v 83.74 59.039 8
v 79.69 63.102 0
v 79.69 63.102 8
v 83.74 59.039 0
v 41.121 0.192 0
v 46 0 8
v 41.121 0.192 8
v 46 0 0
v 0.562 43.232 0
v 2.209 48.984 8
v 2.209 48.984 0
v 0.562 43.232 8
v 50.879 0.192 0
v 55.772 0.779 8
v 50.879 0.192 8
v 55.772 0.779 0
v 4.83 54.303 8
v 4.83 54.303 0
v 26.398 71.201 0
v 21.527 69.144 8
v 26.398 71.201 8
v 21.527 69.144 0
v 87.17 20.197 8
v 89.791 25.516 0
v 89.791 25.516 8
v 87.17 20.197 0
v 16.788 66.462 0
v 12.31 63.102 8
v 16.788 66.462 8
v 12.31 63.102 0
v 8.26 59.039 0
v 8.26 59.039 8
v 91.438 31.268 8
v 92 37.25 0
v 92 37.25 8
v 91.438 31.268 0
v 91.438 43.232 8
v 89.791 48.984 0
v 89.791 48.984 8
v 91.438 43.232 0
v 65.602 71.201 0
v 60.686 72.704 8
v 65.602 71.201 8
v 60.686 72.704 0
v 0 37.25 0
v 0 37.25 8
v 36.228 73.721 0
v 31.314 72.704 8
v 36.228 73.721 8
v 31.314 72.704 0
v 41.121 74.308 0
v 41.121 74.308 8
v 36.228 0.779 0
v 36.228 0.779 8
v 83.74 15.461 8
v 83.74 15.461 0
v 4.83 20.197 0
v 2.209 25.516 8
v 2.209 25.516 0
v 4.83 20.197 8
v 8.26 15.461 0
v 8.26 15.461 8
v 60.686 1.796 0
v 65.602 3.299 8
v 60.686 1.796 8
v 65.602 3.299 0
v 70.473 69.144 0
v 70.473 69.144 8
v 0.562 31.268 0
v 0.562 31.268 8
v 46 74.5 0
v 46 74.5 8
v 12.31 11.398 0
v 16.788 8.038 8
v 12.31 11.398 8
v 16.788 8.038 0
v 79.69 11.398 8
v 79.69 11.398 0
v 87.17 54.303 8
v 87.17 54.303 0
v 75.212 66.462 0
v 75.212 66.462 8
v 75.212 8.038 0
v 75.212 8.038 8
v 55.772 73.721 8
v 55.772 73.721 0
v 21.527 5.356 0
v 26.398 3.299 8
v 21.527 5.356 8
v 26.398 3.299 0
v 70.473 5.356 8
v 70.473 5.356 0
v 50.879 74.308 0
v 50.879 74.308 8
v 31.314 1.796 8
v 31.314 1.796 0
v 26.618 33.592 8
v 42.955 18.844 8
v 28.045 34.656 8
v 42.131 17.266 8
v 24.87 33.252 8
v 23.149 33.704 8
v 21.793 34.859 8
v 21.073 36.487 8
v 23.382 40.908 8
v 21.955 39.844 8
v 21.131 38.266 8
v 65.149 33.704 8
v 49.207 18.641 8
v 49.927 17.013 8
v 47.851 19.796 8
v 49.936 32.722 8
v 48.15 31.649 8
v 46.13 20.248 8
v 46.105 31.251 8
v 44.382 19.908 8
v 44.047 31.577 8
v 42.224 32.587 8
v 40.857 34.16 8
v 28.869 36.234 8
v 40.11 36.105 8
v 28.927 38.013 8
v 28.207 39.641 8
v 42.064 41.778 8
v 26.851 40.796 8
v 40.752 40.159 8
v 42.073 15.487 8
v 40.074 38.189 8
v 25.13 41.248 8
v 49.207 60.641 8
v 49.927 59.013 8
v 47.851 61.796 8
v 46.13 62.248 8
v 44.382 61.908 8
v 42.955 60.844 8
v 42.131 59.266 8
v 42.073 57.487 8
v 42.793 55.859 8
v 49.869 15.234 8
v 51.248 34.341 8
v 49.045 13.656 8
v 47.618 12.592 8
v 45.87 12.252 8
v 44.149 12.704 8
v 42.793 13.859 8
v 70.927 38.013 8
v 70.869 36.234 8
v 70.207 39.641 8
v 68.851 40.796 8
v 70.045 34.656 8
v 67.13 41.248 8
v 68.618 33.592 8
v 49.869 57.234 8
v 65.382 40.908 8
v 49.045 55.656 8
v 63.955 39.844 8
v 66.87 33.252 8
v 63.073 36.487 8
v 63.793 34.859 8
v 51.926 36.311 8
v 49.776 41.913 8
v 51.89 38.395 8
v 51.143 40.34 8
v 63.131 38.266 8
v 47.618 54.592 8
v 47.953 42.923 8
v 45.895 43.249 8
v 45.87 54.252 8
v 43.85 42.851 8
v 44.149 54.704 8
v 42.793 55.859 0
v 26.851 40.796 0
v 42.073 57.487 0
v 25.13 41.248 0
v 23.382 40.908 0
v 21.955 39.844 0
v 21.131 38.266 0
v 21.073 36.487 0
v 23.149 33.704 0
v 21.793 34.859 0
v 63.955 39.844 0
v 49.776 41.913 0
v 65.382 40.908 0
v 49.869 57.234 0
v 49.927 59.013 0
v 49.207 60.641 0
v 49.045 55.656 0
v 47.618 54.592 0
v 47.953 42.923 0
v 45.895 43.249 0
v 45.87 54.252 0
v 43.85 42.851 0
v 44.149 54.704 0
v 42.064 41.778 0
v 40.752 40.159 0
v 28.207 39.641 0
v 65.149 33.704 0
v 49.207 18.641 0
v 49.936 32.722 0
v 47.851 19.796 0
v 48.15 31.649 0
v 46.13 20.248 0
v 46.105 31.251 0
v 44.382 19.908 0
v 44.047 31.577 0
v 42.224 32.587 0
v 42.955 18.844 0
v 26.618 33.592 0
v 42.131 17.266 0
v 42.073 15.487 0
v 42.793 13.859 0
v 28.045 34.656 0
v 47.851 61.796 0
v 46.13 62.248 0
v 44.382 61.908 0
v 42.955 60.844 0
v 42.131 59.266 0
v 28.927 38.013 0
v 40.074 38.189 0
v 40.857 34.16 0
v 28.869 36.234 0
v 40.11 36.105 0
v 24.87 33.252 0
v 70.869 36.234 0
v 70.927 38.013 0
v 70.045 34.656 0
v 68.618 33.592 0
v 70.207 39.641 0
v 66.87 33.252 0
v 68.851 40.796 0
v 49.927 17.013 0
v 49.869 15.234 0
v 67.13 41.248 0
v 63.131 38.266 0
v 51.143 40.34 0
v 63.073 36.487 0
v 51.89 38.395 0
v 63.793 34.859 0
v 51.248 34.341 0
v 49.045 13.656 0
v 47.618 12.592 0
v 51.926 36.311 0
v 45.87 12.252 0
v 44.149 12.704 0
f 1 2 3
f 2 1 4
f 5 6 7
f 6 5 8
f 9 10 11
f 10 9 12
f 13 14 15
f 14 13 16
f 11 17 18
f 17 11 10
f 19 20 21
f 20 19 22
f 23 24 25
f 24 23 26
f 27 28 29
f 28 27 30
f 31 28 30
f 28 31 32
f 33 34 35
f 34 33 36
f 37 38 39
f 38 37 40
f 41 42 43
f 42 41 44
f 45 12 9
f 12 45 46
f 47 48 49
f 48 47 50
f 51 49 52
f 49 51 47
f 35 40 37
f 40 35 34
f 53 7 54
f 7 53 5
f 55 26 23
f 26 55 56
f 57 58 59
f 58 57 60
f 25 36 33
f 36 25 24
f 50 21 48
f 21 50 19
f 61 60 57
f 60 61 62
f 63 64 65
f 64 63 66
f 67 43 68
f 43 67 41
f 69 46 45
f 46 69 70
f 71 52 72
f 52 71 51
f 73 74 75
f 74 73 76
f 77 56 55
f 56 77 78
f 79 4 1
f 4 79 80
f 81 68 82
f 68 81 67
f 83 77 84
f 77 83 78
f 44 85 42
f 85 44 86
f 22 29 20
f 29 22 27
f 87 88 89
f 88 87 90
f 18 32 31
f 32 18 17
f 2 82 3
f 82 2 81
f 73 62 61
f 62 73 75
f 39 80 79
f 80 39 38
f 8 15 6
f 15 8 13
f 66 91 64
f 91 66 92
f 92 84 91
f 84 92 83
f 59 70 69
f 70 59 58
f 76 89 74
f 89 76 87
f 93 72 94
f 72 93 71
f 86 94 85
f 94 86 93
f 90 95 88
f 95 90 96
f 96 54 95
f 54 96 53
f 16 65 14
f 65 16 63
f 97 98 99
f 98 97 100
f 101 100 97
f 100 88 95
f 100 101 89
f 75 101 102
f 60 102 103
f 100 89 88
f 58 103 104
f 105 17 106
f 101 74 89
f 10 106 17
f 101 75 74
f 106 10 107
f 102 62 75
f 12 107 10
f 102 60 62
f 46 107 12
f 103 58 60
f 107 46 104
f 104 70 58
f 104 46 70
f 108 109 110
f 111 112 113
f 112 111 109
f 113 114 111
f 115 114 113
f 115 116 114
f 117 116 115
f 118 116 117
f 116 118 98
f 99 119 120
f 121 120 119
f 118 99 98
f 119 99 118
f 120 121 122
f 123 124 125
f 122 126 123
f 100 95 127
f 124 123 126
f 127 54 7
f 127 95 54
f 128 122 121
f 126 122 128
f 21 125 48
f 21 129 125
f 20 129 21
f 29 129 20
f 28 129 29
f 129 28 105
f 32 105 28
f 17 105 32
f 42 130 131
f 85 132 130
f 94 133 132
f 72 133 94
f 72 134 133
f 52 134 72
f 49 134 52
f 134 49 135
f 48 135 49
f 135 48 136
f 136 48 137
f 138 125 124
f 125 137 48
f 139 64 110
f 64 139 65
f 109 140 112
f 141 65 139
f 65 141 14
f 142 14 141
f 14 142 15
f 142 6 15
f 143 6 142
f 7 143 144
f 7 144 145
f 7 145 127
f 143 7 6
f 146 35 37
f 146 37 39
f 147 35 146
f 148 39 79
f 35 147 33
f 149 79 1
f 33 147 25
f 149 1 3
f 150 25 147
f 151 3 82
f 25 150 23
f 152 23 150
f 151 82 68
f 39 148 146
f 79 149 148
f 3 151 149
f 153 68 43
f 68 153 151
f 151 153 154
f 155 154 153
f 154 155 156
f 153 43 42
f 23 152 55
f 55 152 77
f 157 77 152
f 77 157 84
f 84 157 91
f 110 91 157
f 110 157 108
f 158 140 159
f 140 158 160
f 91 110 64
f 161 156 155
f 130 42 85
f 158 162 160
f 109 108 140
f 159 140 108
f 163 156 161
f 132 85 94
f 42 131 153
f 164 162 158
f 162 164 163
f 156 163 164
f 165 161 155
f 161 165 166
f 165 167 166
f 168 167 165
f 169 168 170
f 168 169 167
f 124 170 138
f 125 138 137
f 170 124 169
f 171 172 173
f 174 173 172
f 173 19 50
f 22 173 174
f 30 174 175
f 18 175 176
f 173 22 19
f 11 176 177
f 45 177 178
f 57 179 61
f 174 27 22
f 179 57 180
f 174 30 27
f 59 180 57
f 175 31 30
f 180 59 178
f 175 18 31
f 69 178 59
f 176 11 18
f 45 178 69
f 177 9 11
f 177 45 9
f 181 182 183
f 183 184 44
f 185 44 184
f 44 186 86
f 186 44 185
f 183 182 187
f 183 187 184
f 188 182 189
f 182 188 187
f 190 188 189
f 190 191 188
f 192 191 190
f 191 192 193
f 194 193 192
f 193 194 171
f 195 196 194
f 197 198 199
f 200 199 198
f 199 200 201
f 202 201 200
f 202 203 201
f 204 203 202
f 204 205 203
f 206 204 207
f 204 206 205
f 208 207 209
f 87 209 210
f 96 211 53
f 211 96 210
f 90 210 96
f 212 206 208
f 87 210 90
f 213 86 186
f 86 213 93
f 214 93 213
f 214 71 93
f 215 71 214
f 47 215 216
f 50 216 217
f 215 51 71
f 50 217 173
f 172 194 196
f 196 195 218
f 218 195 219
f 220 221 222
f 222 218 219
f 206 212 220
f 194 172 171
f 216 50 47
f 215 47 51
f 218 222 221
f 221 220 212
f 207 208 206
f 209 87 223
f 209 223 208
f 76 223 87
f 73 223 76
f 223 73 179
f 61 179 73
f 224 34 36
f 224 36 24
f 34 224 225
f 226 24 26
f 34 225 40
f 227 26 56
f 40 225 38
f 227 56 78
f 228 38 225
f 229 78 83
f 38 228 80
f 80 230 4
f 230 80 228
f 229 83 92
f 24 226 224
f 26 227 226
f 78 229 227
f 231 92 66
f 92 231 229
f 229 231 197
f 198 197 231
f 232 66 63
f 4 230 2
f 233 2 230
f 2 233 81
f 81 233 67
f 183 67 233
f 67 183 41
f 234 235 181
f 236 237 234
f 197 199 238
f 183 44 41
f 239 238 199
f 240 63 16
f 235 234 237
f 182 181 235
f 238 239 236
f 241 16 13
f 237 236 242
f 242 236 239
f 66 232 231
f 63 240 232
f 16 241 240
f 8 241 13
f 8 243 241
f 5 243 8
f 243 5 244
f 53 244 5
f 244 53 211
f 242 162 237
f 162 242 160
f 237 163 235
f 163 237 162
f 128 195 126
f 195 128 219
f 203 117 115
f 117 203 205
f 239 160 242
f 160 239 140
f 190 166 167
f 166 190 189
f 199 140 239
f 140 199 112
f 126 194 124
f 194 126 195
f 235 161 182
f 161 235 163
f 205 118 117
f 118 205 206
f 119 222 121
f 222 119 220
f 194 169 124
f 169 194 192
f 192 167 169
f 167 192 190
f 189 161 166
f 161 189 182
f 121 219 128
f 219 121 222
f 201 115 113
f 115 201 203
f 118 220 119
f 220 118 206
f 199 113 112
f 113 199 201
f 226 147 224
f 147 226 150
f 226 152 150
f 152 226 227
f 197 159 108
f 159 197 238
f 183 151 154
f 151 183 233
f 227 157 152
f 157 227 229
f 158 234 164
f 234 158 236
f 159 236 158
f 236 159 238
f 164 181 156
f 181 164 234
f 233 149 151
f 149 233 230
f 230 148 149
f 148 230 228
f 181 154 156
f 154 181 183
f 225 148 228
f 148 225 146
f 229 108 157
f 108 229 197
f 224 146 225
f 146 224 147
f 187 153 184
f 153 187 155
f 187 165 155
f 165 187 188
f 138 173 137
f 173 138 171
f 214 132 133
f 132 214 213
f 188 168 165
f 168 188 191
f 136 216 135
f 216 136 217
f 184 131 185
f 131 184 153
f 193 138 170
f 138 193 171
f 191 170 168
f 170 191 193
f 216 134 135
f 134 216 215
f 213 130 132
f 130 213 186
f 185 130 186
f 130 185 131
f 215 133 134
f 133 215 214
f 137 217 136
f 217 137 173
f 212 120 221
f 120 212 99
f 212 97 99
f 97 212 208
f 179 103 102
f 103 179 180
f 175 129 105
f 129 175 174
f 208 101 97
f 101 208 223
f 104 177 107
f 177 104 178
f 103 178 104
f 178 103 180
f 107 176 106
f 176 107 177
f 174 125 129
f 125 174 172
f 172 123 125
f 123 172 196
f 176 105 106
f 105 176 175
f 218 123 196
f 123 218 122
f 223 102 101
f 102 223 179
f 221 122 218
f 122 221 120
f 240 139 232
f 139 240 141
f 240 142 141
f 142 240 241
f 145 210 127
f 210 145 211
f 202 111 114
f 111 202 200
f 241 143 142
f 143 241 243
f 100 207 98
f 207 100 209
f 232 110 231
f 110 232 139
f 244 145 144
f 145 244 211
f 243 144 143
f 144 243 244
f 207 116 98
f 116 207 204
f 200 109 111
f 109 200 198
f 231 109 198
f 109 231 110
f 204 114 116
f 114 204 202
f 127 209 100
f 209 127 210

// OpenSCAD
$fn = 32;

// ----------------------------------------------------------------------
// Cam plate: double_lobe cam, base R36
// ----------------------------------------------------------------------

// --- parameters (mm) ---
base_r = 36;              // base circle radius
lobe_h = 10;              // cam lobe rise
bore_r = 6;               // shaft bore radius
plate_t = 8;              // plate thickness, Z (extrusion height)
ring_r = 21;              // lightening ring radius
bolt_r = 4;               // lightening hole radius

profile = [[92, 37.25], [91.438, 43.232], [89.791, 48.984], [87.17, 54.303], [83.74, 59.039], [79.69, 63.102], [75.212, 66.462], [70.473, 69.144], [65.602, 71.201], [60.686, 72.704], [55.772, 73.721], [50.879, 74.308], [46, 74.5], [41.121, 74.308], [36.228, 73.721], [31.314, 72.704], [26.398, 71.201], [21.527, 69.144], [16.788, 66.462], [12.31, 63.102], [8.26, 59.039], [4.83, 54.303], [2.209, 48.984], [0.562, 43.232], [0, 37.25], [0.562, 31.268], [2.209, 25.516], [4.83, 20.197], [8.26, 15.461], [12.31, 11.398], [16.788, 8.038], [21.527, 5.356], [26.398, 3.299], [31.314, 1.796], [36.228, 0.779], [41.121, 0.192], [46, 0], [50.879, 0.192], [55.772, 0.779], [60.686, 1.796], [65.602, 3.299], [70.473, 5.356], [75.212, 8.038], [79.69, 11.398], [83.74, 15.461], [87.17, 20.197], [89.791, 25.516], [91.438, 31.268]];  // primary outline, 48 points, counter clockwise
void_1 = [[51.89, 38.395], [51.143, 40.34], [49.776, 41.913], [47.953, 42.923], [45.895, 43.249], [43.85, 42.851], [42.064, 41.778], [40.752, 40.159], [40.074, 38.189], [40.11, 36.105], [40.857, 34.16], [42.224, 32.587], [44.047, 31.577], [46.105, 31.251], [48.15, 31.649], [49.936, 32.722], [51.248, 34.341], [51.926, 36.311]];  // shaft bore, 18 points
void_2 = [[70.927, 38.013], [70.207, 39.641], [68.851, 40.796], [67.13, 41.248], [65.382, 40.908], [63.955, 39.844], [63.131, 38.266], [63.073, 36.487], [63.793, 34.859], [65.149, 33.704], [66.87, 33.252], [68.618, 33.592], [70.045, 34.656], [70.869, 36.234]];  // lightening hole 1, 14 points
void_3 = [[49.927, 59.013], [49.207, 60.641], [47.851, 61.796], [46.13, 62.248], [44.382, 61.908], [42.955, 60.844], [42.131, 59.266], [42.073, 57.487], [42.793, 55.859], [44.149, 54.704], [45.87, 54.252], [47.618, 54.592], [49.045, 55.656], [49.869, 57.234]];  // lightening hole 2, 14 points
void_4 = [[28.927, 38.013], [28.207, 39.641], [26.851, 40.796], [25.13, 41.248], [23.382, 40.908], [21.955, 39.844], [21.131, 38.266], [21.073, 36.487], [21.793, 34.859], [23.149, 33.704], [24.87, 33.252], [26.618, 33.592], [28.045, 34.656], [28.869, 36.234]];  // lightening hole 3, 14 points
void_5 = [[49.927, 17.013], [49.207, 18.641], [47.851, 19.796], [46.13, 20.248], [44.382, 19.908], [42.955, 18.844], [42.131, 17.266], [42.073, 15.487], [42.793, 13.859], [44.149, 12.704], [45.87, 12.252], [47.618, 12.592], [49.045, 13.656], [49.869, 15.234]];  // lightening hole 4, 14 points

// --- the one profile operation ---
difference() {
  linear_extrude(height = plate_t) polygon(points = profile);
  translate([0, 0, -1])
    linear_extrude(height = plate_t + 2) polygon(points = void_1);
  translate([0, 0, -1])
    linear_extrude(height = plate_t + 2) polygon(points = void_2);
  translate([0, 0, -1])
    linear_extrude(height = plate_t + 2) polygon(points = void_3);
  translate([0, 0, -1])
    linear_extrude(height = plate_t + 2) polygon(points = void_4);
  translate([0, 0, -1])
    linear_extrude(height = plate_t + 2) polygon(points = void_5);
}
